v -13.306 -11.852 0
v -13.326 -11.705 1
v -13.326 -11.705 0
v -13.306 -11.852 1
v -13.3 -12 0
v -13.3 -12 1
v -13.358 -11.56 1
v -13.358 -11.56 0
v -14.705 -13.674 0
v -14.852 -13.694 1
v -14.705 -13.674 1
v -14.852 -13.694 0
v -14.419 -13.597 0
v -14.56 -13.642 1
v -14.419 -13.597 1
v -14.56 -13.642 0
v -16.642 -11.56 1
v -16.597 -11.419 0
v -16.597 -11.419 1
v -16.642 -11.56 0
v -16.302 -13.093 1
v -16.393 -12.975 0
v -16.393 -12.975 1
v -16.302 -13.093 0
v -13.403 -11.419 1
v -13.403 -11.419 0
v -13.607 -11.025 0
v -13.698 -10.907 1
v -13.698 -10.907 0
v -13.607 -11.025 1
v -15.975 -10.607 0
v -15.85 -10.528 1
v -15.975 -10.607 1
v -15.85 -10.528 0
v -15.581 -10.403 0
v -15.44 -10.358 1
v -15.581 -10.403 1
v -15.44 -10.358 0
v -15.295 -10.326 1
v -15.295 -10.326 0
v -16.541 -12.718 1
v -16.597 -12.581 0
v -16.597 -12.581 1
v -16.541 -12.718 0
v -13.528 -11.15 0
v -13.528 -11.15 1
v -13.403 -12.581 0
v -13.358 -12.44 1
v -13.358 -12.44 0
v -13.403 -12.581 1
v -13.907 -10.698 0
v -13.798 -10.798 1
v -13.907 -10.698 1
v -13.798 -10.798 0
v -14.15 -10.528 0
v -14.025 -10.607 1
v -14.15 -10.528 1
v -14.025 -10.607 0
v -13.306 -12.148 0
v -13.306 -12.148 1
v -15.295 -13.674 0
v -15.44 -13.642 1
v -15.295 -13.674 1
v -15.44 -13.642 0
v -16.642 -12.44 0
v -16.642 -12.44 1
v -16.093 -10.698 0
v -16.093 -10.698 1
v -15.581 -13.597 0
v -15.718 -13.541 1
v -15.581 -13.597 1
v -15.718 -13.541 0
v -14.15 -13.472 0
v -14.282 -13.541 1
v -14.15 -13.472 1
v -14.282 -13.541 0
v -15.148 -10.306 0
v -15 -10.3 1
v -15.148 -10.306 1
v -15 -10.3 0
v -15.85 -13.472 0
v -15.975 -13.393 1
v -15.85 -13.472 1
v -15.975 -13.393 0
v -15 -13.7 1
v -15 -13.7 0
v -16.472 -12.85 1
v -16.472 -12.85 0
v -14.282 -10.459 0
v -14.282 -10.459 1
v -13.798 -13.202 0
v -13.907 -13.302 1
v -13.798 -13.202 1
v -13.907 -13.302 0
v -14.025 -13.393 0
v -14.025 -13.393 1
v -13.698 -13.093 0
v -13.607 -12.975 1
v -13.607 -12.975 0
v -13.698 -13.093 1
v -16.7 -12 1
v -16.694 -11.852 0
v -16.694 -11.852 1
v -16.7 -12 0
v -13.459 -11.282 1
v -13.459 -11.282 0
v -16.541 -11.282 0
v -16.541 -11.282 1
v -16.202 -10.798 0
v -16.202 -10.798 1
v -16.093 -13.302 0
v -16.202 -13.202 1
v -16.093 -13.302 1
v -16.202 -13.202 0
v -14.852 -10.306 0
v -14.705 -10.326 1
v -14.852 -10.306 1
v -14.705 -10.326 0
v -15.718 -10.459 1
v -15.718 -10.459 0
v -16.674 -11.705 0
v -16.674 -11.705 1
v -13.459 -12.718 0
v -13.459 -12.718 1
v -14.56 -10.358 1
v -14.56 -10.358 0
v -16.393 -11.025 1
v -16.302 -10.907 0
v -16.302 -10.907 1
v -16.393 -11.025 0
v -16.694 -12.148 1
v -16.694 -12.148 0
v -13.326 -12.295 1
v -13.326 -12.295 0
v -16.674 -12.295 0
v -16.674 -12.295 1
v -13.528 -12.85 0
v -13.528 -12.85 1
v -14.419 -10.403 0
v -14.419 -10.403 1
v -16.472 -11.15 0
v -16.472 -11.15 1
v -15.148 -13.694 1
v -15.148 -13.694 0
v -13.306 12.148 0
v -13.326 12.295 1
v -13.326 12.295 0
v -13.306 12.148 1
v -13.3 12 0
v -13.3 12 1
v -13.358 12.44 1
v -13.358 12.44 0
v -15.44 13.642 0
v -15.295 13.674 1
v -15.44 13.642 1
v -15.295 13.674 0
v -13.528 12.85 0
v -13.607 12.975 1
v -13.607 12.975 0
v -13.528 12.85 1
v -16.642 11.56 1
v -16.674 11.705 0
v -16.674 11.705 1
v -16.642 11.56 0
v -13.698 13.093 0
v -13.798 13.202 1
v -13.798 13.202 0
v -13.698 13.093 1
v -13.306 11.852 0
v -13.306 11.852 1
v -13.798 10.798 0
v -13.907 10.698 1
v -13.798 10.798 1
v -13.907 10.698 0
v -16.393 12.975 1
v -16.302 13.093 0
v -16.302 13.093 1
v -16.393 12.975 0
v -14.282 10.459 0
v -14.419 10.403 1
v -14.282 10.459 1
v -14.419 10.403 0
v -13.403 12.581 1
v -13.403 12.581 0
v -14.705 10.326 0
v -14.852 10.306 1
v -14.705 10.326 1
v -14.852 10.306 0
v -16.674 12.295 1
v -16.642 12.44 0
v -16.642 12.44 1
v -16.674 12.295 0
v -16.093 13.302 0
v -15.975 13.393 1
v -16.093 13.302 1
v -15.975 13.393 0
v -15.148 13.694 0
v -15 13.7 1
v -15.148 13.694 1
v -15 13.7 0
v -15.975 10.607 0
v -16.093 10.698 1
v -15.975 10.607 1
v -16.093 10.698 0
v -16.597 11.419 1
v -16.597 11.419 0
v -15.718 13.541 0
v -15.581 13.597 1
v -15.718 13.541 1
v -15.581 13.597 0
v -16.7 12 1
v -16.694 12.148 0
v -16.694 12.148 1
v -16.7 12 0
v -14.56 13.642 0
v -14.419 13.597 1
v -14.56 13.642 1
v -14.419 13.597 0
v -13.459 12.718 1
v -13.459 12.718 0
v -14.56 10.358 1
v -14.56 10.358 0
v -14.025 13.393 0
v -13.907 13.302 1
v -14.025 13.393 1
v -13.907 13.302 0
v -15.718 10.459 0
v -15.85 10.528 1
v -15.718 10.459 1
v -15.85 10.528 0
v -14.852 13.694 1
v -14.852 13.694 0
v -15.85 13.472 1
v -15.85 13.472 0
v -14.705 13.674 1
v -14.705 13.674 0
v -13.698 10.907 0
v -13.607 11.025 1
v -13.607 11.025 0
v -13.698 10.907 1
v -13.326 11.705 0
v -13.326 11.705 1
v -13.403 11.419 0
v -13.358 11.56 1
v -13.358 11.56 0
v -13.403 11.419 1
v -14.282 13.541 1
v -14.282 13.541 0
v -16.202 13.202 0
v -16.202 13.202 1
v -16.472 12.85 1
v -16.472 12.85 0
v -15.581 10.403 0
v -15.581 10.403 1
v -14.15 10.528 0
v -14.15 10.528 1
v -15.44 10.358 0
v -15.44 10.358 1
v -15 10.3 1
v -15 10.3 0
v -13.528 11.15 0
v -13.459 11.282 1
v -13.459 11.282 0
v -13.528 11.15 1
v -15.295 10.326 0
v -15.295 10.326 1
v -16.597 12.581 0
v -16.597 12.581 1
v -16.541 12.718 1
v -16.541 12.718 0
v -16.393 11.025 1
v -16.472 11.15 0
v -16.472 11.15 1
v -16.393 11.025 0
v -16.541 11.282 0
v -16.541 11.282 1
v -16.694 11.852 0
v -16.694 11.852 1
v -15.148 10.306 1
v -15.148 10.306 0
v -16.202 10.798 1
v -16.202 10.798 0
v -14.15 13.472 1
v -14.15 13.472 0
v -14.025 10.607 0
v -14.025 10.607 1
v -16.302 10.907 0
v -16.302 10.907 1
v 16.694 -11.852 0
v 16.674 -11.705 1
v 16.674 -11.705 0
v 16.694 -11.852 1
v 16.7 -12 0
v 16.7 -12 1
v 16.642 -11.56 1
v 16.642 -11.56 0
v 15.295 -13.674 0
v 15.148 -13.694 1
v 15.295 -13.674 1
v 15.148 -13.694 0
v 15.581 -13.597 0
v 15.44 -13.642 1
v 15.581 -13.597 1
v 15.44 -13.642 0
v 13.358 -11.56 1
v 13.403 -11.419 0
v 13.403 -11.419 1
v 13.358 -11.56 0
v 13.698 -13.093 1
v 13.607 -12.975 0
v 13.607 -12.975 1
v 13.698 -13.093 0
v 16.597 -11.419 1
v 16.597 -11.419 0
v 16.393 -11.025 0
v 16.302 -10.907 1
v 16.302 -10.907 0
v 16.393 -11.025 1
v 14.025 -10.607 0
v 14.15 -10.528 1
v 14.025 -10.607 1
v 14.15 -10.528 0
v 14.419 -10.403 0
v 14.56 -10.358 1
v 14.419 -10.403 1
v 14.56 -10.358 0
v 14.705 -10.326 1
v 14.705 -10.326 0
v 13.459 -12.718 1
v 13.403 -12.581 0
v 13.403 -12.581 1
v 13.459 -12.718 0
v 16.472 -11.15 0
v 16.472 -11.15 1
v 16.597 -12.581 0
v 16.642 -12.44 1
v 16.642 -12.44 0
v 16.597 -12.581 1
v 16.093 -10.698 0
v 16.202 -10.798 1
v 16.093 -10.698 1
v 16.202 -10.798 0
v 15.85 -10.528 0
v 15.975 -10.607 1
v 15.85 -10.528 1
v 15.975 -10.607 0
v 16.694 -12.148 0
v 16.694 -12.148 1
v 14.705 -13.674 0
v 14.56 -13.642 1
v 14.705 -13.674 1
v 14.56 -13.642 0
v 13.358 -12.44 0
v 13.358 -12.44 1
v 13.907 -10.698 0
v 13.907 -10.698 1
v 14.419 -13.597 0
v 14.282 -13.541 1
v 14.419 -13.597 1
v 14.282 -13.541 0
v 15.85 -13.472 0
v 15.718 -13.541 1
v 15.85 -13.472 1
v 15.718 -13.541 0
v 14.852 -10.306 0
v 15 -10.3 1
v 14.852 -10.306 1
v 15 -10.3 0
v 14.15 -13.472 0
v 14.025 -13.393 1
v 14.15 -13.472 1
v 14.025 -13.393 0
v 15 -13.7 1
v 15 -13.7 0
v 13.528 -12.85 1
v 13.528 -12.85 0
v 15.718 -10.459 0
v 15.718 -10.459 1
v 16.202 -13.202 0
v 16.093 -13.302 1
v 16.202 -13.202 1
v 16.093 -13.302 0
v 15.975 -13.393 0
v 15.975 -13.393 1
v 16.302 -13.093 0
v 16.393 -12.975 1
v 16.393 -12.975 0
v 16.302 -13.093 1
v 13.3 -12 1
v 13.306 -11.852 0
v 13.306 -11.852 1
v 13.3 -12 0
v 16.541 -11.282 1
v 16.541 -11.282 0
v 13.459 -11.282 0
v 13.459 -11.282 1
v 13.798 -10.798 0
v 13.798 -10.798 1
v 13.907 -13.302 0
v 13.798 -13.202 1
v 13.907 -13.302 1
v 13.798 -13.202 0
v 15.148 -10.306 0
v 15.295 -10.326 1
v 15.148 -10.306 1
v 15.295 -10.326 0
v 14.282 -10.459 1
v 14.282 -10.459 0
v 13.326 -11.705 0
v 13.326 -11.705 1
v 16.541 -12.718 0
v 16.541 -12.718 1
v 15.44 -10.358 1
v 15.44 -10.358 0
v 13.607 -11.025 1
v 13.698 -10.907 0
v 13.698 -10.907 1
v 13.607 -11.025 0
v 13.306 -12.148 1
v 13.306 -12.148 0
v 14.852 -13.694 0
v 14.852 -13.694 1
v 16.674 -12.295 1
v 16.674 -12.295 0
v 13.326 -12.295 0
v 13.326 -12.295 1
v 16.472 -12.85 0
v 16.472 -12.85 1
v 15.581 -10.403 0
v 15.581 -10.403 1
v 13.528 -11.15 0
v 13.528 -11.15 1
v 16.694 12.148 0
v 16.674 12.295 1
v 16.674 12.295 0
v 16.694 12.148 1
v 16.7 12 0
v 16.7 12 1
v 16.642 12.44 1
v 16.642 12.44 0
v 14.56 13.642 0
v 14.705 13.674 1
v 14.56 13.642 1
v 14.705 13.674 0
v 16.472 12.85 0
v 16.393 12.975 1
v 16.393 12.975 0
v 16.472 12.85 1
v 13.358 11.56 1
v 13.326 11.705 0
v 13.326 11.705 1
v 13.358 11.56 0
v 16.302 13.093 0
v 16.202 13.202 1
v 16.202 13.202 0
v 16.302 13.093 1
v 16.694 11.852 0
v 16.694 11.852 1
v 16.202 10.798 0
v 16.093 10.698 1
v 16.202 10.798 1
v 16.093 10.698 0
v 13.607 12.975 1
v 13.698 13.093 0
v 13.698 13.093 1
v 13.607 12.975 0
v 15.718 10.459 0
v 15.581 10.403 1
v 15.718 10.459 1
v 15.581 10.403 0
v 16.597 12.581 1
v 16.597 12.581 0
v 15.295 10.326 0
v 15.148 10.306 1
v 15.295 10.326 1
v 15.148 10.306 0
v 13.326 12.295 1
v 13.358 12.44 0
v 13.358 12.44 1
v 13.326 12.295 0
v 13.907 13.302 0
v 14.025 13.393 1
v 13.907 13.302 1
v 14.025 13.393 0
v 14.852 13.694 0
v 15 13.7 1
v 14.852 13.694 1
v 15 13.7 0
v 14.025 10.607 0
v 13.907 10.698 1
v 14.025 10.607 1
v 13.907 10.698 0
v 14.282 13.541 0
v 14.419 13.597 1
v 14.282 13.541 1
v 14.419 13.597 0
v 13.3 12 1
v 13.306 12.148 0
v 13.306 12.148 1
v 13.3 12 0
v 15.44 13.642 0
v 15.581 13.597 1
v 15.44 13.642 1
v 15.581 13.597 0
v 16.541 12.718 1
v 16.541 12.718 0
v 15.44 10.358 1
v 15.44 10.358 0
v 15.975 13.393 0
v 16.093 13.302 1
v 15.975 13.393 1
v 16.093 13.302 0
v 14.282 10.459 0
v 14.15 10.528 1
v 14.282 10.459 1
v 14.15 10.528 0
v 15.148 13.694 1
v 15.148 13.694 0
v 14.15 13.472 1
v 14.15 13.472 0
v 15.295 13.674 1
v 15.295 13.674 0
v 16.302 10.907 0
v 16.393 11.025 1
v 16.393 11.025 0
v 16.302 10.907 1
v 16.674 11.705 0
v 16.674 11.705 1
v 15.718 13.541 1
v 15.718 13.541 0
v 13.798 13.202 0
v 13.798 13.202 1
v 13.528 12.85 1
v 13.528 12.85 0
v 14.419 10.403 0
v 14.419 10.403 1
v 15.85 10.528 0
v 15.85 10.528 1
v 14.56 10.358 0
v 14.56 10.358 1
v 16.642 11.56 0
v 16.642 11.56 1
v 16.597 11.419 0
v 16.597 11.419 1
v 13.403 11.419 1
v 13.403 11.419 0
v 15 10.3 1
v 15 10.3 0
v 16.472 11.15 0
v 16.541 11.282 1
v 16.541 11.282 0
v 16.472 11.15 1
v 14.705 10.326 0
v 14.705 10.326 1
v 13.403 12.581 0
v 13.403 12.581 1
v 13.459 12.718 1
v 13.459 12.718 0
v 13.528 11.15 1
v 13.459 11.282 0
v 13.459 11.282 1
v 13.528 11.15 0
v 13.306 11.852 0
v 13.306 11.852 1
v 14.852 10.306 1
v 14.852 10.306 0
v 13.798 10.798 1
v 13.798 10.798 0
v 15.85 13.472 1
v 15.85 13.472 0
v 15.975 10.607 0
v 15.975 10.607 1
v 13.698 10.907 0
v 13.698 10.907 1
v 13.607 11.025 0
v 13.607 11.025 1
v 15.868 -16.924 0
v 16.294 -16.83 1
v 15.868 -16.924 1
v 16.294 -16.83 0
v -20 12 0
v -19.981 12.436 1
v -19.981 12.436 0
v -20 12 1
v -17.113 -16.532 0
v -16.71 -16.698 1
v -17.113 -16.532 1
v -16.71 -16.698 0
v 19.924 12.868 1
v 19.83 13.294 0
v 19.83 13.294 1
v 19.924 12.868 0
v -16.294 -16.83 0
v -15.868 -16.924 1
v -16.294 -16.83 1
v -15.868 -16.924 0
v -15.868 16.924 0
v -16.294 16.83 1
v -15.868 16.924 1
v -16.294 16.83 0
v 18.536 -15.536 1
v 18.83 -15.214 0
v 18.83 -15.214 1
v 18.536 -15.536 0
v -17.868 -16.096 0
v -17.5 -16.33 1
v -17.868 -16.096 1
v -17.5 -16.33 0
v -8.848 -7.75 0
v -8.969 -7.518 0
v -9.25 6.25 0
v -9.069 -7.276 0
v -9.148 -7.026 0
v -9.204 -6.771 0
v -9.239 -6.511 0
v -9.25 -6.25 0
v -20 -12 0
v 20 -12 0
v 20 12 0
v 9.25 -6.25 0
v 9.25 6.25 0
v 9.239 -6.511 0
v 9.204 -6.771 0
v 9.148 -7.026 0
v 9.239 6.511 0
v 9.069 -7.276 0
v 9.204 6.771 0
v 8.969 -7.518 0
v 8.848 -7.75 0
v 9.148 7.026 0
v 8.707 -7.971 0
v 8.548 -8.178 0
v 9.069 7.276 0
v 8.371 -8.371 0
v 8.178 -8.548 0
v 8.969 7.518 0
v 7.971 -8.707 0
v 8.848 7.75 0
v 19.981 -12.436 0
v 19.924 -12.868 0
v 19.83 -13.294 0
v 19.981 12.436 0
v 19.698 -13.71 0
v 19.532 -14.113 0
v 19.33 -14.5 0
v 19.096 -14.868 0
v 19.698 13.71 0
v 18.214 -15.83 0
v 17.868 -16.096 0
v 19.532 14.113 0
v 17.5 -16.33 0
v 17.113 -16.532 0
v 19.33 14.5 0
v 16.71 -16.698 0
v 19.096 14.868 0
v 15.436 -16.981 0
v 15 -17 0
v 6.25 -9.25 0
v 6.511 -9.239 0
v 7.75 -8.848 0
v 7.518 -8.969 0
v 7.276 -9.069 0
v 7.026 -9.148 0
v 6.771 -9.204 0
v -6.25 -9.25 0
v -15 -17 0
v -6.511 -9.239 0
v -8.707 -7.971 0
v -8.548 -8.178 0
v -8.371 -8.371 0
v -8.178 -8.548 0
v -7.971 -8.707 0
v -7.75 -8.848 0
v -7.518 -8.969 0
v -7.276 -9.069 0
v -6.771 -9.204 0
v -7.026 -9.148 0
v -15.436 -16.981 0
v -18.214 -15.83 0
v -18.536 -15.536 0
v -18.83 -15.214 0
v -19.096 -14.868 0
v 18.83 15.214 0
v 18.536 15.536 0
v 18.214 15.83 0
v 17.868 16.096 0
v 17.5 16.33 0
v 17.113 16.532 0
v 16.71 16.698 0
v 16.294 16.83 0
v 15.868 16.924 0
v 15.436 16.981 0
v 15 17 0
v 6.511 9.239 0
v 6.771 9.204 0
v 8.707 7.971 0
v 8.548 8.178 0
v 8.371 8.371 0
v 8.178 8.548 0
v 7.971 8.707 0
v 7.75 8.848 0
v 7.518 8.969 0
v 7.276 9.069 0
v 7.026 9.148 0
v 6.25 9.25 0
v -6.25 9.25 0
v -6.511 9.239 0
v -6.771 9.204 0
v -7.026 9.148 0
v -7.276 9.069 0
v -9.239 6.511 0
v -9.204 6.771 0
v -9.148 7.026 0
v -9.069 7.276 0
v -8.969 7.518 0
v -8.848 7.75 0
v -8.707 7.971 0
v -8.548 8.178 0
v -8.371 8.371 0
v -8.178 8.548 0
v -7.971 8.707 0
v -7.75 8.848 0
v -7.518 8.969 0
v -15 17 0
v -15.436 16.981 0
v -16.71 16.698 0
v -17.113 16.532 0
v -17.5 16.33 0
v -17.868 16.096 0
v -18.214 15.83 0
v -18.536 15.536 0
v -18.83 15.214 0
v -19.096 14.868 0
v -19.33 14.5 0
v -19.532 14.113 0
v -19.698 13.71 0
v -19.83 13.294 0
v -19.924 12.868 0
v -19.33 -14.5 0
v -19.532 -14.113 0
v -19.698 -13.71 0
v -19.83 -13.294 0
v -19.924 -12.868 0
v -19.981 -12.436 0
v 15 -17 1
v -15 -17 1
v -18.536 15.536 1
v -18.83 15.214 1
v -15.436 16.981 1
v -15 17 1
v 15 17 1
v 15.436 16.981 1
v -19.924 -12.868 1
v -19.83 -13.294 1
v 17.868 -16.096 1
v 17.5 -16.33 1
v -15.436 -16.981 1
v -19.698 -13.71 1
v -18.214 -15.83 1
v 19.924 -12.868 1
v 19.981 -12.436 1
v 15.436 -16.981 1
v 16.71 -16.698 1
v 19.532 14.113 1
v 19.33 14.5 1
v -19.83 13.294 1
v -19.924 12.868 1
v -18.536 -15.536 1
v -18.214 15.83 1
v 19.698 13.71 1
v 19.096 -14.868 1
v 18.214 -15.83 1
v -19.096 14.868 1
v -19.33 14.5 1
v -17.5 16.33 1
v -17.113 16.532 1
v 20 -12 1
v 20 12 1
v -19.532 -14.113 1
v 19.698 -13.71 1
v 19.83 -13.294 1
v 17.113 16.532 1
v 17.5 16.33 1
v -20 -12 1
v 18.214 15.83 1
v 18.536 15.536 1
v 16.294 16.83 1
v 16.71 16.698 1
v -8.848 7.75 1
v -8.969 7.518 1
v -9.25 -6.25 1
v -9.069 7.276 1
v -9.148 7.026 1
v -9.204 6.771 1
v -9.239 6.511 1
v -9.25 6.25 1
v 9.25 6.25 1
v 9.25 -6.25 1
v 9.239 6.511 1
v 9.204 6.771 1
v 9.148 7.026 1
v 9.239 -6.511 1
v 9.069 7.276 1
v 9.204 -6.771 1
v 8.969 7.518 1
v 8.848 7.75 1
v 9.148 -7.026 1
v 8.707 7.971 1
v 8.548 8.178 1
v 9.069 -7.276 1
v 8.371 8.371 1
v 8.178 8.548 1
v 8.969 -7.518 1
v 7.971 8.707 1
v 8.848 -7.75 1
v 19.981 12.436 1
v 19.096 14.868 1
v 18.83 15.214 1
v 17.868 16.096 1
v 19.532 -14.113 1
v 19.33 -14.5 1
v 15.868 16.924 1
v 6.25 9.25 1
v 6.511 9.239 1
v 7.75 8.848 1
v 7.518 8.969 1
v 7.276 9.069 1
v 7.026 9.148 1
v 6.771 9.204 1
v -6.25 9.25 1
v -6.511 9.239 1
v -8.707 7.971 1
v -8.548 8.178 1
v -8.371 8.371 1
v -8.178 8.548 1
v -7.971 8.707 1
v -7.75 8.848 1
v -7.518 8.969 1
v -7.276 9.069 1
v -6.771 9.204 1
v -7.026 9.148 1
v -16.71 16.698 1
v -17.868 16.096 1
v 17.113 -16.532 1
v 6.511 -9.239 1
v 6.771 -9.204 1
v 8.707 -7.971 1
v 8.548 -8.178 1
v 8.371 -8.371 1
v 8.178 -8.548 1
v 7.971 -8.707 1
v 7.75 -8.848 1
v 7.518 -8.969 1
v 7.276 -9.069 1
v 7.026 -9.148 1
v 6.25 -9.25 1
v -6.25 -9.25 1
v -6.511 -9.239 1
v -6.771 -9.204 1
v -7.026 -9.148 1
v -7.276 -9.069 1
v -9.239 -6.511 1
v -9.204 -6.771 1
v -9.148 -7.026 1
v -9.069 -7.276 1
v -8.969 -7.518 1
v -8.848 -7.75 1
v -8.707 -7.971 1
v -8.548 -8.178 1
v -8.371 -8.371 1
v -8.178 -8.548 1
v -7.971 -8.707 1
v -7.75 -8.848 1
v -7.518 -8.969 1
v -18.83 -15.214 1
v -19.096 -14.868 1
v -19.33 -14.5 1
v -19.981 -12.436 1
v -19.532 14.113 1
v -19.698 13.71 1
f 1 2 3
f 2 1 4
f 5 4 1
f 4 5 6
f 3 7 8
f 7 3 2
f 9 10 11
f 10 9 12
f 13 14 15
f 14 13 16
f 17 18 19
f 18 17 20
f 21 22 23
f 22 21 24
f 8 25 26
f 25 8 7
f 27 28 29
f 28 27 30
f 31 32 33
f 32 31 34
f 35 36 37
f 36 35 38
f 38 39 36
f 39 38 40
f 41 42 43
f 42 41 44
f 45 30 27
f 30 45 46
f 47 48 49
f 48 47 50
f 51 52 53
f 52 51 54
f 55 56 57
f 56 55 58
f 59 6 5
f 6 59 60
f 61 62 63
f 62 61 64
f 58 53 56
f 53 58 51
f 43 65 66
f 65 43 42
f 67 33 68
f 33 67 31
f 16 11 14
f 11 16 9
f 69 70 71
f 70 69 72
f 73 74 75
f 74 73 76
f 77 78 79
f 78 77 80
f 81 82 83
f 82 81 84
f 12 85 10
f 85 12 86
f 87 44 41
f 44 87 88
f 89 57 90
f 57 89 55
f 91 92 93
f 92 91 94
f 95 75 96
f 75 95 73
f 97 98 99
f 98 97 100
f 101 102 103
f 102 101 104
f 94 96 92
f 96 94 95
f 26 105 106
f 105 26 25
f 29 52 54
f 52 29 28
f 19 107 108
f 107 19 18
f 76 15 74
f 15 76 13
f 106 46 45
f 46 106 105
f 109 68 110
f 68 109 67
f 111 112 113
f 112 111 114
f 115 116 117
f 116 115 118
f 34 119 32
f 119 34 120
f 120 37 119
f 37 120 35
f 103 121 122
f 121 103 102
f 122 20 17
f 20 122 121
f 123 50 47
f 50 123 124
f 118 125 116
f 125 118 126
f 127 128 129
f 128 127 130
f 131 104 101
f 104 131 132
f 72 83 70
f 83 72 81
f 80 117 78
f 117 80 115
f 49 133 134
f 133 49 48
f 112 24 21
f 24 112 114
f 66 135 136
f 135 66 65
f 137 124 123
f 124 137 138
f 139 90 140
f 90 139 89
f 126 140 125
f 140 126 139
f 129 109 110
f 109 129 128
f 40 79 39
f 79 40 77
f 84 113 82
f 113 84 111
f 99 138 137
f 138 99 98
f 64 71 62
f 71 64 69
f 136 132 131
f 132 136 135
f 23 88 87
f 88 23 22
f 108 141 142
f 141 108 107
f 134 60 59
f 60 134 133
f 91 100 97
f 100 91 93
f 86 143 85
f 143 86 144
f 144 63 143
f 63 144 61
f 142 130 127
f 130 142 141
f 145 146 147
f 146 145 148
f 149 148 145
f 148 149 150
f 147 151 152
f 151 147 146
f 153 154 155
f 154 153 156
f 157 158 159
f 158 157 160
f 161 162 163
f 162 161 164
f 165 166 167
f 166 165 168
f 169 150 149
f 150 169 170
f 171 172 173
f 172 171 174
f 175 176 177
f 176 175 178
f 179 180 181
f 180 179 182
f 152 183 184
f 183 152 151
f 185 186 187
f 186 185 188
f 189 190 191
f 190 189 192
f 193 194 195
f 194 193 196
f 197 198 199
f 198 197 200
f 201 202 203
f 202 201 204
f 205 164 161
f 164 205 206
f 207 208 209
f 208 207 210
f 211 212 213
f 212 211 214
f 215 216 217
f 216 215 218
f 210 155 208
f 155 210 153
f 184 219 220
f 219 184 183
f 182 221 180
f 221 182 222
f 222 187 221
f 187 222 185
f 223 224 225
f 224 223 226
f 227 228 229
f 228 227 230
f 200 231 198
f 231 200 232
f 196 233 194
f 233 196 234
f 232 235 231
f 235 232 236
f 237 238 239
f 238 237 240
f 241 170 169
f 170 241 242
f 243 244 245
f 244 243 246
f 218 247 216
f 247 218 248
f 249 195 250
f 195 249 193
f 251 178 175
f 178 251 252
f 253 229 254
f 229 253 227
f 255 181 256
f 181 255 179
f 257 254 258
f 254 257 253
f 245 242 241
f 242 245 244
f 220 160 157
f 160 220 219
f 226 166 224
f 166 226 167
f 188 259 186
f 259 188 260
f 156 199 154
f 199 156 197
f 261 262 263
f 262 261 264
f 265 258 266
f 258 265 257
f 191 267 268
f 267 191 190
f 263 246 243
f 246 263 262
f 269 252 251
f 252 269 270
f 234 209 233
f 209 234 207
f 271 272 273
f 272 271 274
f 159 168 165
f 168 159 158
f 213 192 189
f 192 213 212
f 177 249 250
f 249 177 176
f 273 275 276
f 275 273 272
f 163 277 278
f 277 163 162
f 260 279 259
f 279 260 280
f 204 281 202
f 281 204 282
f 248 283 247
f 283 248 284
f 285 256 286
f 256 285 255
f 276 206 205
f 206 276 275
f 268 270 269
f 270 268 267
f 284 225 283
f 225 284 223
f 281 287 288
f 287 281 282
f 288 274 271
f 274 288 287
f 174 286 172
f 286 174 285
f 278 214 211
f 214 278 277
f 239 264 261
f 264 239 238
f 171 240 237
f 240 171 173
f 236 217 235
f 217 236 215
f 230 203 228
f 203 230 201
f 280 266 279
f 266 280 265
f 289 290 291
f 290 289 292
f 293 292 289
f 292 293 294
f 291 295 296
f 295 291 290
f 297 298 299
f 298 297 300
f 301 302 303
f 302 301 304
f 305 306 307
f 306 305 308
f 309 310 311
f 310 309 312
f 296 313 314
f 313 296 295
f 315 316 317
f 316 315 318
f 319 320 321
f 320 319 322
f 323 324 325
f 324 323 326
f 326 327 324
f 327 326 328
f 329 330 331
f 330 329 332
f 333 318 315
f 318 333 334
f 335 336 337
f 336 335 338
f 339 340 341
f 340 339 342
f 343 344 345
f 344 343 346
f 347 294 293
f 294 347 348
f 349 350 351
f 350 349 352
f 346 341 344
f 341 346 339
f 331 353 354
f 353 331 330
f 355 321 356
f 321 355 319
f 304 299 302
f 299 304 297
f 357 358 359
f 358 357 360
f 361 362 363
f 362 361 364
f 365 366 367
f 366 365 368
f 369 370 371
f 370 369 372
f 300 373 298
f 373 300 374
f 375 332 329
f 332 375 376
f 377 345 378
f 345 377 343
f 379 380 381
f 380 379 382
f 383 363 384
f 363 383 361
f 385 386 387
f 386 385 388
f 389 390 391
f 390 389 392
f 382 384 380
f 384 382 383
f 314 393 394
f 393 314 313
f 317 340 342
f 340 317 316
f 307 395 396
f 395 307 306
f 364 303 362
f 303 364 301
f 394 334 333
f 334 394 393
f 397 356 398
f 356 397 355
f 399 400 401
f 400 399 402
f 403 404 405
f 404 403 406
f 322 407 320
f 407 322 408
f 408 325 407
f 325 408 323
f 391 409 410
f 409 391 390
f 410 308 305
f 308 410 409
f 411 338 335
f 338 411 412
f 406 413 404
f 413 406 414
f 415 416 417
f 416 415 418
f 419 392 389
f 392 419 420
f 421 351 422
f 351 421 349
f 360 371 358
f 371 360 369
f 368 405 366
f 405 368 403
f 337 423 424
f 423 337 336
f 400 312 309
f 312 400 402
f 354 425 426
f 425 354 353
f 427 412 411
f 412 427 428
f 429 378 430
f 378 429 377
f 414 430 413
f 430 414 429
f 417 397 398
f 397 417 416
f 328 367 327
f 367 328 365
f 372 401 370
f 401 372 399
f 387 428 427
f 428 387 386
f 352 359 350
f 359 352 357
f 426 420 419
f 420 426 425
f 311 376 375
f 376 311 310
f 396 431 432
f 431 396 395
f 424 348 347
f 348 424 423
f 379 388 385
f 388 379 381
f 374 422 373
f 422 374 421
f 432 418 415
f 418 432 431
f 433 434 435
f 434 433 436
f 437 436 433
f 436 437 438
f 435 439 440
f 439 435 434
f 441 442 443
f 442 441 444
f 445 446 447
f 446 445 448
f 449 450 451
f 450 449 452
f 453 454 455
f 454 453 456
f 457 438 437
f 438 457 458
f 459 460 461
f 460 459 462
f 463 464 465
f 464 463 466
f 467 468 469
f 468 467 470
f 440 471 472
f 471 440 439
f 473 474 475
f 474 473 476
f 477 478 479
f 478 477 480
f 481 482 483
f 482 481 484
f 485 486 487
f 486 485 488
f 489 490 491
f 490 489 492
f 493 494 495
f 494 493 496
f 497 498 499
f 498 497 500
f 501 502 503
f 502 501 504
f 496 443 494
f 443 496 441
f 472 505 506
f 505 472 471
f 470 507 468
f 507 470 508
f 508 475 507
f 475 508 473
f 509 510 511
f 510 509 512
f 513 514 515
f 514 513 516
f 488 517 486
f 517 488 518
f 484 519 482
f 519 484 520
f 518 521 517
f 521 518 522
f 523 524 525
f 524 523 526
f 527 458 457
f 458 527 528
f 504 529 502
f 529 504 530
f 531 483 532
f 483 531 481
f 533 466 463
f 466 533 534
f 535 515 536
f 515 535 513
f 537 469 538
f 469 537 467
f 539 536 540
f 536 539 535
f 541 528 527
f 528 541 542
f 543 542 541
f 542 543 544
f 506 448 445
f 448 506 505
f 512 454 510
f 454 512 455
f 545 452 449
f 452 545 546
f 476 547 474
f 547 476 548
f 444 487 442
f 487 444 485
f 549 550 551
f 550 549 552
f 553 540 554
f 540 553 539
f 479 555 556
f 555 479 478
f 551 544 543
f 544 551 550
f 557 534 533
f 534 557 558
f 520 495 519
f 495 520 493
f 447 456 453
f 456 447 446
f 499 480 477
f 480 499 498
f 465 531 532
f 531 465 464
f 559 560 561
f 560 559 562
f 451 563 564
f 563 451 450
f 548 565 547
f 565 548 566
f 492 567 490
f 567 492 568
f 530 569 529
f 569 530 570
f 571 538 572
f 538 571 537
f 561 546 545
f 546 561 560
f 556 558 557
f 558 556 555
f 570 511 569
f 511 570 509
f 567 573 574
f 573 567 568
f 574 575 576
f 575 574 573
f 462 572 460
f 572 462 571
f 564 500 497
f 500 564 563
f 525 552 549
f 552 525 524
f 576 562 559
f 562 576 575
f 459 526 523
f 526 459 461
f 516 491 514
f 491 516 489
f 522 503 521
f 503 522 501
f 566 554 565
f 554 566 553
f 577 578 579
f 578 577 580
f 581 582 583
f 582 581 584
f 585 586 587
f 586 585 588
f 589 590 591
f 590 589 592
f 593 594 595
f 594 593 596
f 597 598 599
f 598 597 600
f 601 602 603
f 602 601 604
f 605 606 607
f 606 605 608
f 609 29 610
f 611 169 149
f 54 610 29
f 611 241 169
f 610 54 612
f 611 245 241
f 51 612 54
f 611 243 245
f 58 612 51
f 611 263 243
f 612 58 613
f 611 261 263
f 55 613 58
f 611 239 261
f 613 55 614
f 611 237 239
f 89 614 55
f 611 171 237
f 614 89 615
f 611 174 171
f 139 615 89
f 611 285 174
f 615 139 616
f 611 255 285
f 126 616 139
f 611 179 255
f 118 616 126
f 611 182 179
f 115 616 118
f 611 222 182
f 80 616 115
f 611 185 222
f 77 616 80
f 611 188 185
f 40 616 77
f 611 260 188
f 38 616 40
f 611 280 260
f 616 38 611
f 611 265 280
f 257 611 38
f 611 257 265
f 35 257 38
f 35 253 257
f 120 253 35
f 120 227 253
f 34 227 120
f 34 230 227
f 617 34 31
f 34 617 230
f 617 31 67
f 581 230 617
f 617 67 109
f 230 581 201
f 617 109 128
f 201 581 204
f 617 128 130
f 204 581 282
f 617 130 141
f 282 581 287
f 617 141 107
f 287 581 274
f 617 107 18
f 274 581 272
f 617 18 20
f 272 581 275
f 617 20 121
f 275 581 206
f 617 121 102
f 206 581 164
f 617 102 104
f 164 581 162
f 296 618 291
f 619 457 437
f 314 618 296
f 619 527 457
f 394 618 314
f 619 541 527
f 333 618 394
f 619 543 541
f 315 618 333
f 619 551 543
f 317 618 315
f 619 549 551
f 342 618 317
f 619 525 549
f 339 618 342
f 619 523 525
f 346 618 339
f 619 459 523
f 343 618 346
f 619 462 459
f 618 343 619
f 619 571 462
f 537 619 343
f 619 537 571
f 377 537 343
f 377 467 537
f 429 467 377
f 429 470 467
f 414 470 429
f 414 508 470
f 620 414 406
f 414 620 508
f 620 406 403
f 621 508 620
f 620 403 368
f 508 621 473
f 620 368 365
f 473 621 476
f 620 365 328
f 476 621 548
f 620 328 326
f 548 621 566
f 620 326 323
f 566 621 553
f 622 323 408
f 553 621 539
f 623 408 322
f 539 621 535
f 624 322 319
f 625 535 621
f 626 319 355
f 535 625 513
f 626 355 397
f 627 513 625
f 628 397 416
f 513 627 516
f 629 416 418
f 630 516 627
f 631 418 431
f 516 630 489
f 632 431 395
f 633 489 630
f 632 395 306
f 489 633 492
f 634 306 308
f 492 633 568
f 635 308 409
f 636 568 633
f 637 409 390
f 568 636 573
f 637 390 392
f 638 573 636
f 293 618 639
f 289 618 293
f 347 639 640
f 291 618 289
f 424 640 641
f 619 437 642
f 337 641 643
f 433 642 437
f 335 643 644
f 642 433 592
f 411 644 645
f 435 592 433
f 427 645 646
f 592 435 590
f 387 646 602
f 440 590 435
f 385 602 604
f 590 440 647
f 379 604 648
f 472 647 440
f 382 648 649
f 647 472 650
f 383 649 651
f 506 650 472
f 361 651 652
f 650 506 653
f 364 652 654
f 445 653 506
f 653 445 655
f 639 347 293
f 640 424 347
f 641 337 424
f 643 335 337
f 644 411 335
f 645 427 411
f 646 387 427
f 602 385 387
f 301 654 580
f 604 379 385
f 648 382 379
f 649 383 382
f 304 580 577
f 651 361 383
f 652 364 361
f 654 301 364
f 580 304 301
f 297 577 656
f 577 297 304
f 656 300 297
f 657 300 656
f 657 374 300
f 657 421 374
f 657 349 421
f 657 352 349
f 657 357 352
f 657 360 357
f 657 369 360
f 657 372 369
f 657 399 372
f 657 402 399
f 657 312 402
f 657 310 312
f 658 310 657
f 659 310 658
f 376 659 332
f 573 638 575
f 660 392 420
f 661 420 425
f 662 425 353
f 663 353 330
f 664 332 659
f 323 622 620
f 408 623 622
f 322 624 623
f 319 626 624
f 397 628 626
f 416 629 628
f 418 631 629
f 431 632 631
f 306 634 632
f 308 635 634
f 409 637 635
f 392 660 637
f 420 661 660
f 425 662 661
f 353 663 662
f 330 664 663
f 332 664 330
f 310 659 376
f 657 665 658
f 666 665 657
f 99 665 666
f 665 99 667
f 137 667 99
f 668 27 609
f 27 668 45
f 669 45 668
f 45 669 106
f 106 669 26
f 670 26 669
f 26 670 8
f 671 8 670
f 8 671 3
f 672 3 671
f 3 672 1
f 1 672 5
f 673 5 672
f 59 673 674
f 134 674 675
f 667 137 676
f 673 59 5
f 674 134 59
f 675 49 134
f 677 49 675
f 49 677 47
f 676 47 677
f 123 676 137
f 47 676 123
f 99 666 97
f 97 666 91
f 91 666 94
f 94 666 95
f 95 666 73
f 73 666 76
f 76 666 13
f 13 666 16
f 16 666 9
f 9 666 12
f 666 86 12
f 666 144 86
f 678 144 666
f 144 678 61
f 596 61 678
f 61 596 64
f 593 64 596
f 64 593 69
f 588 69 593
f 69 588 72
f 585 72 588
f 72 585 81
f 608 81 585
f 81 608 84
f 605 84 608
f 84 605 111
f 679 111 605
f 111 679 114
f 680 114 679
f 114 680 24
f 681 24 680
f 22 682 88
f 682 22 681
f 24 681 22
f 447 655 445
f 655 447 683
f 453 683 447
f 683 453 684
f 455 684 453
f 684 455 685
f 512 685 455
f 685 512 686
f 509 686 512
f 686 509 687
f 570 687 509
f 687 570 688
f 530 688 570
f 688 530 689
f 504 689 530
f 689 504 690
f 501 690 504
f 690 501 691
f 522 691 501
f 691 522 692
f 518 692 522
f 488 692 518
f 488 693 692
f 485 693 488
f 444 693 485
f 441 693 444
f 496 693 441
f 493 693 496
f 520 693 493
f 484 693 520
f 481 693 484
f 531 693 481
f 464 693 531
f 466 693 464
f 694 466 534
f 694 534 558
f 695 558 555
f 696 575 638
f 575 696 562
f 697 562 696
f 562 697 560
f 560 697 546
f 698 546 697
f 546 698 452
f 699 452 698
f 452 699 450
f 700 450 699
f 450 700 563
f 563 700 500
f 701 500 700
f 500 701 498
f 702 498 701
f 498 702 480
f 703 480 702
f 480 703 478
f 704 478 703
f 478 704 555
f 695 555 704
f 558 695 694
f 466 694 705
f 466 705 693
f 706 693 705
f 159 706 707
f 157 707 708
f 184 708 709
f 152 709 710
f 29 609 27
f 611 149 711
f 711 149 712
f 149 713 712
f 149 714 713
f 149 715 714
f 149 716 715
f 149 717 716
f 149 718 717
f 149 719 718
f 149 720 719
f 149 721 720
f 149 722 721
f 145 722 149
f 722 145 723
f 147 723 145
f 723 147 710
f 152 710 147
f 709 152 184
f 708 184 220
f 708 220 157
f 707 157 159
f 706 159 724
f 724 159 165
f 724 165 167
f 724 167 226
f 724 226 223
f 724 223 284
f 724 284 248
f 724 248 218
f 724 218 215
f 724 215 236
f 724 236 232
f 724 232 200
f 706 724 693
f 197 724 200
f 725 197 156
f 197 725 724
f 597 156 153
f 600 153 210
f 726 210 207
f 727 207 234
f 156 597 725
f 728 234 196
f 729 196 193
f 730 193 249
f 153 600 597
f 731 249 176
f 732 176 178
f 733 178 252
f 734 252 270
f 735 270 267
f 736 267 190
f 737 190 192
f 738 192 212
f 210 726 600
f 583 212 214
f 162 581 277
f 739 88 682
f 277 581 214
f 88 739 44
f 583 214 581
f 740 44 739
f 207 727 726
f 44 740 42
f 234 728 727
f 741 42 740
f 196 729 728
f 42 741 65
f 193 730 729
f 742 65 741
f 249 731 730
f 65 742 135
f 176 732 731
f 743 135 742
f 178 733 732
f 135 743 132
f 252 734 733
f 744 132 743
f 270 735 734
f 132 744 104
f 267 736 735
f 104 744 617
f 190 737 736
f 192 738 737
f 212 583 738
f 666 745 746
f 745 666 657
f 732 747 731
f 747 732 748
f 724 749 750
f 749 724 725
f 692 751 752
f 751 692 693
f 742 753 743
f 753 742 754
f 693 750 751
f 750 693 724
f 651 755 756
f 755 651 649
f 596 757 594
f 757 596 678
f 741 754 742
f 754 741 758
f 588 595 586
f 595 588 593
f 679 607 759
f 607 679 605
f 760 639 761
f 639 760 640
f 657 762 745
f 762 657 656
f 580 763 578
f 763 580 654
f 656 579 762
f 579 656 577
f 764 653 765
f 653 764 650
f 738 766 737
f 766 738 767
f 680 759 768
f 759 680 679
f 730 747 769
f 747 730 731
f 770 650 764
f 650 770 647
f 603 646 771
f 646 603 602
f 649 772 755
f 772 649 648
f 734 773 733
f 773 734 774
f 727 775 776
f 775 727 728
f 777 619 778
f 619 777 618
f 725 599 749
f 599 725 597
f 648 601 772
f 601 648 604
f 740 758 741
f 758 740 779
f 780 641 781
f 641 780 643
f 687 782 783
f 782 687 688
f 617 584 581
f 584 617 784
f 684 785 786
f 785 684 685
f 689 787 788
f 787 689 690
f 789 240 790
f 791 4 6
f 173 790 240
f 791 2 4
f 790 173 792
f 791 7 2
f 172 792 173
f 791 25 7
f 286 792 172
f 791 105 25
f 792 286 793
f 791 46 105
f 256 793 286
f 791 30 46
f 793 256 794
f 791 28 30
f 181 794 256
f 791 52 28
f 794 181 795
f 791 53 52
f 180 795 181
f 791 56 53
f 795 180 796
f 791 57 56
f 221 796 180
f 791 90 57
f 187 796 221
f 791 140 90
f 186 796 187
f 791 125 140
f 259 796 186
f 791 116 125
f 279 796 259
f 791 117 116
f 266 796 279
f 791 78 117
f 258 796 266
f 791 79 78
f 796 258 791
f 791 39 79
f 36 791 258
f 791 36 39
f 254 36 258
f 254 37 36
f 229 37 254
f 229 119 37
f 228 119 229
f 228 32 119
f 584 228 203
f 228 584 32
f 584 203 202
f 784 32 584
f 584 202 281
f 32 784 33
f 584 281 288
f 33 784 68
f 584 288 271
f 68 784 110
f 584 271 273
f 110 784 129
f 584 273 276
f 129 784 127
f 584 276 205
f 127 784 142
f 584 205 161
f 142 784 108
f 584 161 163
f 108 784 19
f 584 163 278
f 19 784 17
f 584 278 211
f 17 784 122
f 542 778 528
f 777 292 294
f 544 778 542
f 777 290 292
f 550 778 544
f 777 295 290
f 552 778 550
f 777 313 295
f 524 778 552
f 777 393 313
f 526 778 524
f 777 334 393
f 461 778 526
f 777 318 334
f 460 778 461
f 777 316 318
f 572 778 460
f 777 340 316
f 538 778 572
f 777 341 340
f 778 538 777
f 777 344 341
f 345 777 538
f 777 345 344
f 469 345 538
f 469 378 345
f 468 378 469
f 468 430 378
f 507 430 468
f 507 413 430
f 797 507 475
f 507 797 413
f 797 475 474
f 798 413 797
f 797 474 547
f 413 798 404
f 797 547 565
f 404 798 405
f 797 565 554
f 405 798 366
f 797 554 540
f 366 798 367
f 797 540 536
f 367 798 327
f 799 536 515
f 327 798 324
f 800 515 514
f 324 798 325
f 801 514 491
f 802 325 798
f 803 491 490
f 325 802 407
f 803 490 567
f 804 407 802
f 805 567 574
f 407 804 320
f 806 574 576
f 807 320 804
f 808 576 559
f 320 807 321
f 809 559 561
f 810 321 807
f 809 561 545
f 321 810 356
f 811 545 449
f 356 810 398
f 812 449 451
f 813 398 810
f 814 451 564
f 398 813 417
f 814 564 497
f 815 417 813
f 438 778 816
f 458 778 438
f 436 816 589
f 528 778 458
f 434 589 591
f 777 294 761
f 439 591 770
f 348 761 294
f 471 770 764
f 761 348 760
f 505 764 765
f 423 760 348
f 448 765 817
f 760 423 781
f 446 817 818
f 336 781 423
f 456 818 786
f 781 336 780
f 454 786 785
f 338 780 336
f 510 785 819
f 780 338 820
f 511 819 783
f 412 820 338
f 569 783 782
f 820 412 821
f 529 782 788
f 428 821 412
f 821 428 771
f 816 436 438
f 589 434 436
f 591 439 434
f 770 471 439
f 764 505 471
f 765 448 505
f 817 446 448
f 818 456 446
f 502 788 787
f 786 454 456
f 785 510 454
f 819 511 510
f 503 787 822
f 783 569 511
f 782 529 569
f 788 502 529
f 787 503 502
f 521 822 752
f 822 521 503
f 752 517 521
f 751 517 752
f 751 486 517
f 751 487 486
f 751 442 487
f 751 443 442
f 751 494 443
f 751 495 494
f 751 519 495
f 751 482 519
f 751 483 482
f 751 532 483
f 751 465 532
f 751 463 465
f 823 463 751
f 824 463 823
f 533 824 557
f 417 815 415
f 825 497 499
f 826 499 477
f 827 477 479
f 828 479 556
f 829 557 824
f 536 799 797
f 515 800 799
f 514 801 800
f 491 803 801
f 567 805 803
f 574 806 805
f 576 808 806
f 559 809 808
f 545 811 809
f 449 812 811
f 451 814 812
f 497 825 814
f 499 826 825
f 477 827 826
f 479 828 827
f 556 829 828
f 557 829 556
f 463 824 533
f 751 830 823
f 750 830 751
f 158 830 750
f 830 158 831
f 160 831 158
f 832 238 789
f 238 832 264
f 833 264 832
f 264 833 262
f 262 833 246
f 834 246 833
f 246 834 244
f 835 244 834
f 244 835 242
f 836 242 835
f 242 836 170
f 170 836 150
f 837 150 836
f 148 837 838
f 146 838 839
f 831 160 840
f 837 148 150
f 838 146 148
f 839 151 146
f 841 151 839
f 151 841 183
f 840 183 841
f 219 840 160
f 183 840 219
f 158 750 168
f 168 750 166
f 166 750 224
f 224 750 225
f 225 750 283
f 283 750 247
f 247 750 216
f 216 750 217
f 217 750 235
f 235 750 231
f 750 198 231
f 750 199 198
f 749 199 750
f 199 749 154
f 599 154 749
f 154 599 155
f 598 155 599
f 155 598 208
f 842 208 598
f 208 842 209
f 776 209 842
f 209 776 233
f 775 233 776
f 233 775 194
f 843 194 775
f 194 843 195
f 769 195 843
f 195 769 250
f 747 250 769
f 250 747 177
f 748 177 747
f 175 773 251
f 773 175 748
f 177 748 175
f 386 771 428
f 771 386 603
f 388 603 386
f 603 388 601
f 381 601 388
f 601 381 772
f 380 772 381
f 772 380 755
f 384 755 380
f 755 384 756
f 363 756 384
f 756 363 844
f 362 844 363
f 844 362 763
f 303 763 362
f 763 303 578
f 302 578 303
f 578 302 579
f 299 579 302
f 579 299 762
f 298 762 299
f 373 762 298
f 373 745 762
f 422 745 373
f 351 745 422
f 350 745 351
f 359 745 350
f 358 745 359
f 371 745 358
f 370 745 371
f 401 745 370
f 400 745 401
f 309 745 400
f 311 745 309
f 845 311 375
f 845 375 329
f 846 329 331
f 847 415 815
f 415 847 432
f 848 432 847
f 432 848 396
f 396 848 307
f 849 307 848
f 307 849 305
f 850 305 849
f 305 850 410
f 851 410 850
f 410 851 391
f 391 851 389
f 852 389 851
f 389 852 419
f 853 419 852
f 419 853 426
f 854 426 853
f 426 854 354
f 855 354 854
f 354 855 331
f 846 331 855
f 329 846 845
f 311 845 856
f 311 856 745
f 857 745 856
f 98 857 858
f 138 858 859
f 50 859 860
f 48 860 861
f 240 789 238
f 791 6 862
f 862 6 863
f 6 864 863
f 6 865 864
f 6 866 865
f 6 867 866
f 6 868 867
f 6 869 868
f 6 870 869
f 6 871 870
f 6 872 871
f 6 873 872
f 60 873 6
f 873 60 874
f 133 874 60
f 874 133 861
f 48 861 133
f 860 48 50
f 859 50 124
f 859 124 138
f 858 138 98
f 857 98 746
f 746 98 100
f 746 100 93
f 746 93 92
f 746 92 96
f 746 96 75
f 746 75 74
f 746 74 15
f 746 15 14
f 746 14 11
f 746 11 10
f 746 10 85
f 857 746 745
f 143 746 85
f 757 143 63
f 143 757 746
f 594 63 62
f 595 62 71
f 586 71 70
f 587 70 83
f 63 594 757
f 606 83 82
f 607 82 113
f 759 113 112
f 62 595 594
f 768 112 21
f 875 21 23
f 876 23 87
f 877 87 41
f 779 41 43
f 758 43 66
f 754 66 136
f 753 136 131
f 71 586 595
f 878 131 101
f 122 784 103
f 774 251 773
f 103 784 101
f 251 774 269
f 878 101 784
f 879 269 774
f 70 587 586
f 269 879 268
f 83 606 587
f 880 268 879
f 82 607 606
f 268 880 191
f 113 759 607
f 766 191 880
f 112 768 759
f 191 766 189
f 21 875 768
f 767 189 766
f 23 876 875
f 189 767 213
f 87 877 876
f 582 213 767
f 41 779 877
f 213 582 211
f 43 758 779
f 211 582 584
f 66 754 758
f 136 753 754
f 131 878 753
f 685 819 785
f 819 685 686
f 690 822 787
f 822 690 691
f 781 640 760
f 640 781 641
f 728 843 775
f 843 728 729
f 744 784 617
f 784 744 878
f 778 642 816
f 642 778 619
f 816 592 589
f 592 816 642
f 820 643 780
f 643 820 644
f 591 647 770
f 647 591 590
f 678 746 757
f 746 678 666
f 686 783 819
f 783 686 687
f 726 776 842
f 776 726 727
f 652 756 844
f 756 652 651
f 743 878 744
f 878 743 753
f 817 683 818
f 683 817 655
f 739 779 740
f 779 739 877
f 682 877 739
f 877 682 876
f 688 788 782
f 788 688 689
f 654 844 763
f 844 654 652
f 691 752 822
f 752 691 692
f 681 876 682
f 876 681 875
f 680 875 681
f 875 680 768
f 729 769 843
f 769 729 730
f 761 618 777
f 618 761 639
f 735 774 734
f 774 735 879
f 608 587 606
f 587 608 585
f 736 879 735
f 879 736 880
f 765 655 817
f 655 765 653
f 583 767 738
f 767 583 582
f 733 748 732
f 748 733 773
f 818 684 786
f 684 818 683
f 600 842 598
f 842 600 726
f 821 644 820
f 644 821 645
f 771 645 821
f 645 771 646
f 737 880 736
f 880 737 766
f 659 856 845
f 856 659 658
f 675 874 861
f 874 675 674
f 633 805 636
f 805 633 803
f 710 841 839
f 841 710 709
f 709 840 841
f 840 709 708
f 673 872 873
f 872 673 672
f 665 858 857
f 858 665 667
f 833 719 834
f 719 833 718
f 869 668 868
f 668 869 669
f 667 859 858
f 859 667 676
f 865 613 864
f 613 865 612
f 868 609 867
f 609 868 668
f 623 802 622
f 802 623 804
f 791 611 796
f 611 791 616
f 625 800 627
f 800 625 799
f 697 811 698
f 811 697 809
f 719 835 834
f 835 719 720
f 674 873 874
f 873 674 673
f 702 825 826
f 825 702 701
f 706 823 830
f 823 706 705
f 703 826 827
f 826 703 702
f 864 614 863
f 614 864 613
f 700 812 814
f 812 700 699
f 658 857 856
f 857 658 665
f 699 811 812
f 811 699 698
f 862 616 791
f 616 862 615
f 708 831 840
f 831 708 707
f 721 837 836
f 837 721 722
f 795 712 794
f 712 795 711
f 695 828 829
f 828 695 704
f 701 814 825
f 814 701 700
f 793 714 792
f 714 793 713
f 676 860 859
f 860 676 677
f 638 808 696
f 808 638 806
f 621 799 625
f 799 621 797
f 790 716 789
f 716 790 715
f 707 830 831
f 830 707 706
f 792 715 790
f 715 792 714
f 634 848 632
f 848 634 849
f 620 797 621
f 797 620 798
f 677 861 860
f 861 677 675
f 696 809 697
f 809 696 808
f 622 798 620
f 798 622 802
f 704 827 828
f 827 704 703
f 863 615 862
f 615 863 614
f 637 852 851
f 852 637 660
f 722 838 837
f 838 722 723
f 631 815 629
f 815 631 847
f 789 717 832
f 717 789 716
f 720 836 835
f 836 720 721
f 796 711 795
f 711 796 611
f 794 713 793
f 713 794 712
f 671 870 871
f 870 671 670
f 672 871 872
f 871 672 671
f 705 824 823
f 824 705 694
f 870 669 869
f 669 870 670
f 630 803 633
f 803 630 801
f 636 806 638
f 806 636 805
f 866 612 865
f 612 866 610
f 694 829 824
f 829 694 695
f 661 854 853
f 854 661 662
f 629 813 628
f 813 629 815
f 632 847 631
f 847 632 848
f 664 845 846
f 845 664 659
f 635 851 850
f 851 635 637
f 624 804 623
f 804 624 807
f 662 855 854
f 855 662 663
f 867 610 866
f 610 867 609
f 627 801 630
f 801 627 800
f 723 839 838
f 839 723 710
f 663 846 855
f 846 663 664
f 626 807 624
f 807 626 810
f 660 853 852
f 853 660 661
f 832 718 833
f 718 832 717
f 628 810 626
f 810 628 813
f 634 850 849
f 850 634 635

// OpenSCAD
// file: woli_config.scad
// ============================================================
// WOLI V1.1 AUDITED FINAL — MASTER PARAMETERS
// Units: mm
// ============================================================

$fn = 72;

// ---------- GLOBAL ----------
fit_clearance = 0.40;
wall = 3.0;
floor_t = 5.0;
cover_t = 2.8;
shell_r = 10.0;

m3_clear = 3.4;
m3_pilot_d = 2.8;
m3_pilot_depth = 4.2;

tie_slot_w = 3.8;
tie_slot_l = 18;

// ---------- BODY ----------
body_w = 170;
body_l = 90;
chassis_h = 31;
top_h = 34;

top_upper_w = 162;
top_upper_l = 80;
top_upper_r = 9;

// ---------- N20 DRIVE ----------
wheel_d = 43;
wheel_w = 17.5;

n20_x = 12;
n20_y = 33;
n20_z = 10;

n20_bracket_x = 25;
n20_bracket_y = 8.5;
n20_bracket_z = 11.5;
n20_bracket_hole_cc = 17;      // approx; slots absorb error

wheel_axis_ground_z = wheel_d/2; // reference only; actual chassis ground plane requires hardware check
wheel_opening_l = 25;            // side wheel cutout depth (Y), mm
motor_y = -body_l/2 + body_l/3;  // wheel center: 1/3 body depth in from front (-Y)
motor_slot_len = 8;
motor_bracket_zone_x = body_w/2 - 18;

// ---------- BALL CASTER ----------
caster_w = 22;
caster_l = 17;
caster_h = 15;
caster_ball_d_visual_ref = 11.5; // photo-only reference; not used for fit
caster_dock_y = body_l/2 - 21;

caster_body_clear = 0.7;
caster_retainer_t = 3.0;
caster_retainer_screw_cc = 27;

caster_mount_x = 15;
caster_mount_y = 12;
caster_floor_open = 18.5;

// ---------- MAIN PCB ----------
pcb_w = 50;
pcb_l = 70;
pcb_stack_h = 15;

pcb_tray_w = 56;
pcb_tray_l = 76;
pcb_mount_cc_x = 44;
pcb_mount_cc_y = 64;

// ---------- MG90S ----------
servo_a = 32.4;
servo_b = 32.5;
servo_c = 12;
servo_fit = 0.7;

// ---------- LIMIT SWITCH ----------
limit_w = 21;
limit_l = 23;
limit_h = 6;

// ---------- VL53L0X ----------
tof_w = 10.7;
tof_l = 25;
tof_h = 11.5;
tof_rail_clear = 0.7;

tof_bezel_w = 34;
tof_bezel_h = 19;

// ---------- PHONE HOLDER / NECK ----------
phone_ball_d = 18.0;            // physical socket fit still required
neck_h = 30;
neck_base_w = 54;
neck_base_l = 42;
neck_base_h = 5;
neck_hole_x = 38;
neck_hole_y = 26;

neck_recess_w = 62;
neck_recess_l = 50;
neck_recess_d = 1.2;

neck_pilot_d = 2.8;
neck_pilot_depth = 7.0;

// reference phone clearance envelope only
phone_ref_w = 165;
phone_ref_h = 82;
phone_ref_t = 12;

// ---------- KLIFE PD-Q2 BATTERY ----------
battery_w = 68;
battery_l = 143;
battery_h = 11;
battery_mass_g = 205;

battery_fit_clear = 0.8;
battery_tray_w = 84;
battery_tray_l = 146;
battery_tray_t = 2.4;
battery_rail_t = 2.5;
battery_rail_h = 5.5;
battery_center_y = -18;

battery_tray_mount_x = 39;
battery_tray_mount_y = 55;

// ---------- UPPER ELECTRONICS DECK ----------
bridge_w = 122;
bridge_l = 94;
bridge_t = 3.0;
bridge_leg_h = 20;
bridge_leg_x = 56;
bridge_leg_y = 36;

module_boss_h = 4.5;
module_boss_d = 8.0;
module_pilot_d = 2.8;

pcb_deck_cx = -25;
pcb_deck_cy = 0;

tb_deck_cx = 34;
tb_deck_cy = 17;

usbc_deck_cx = 36;
usbc_deck_cy = -24;

// ---------- TB6612FNG HW-166 ----------
tb6612_w = 26;
tb6612_l = 26;
tb6612_clear = 0.6;

// total installed height is intentionally not hard-coded

// ---------- USB-C BREAKOUT ----------
usbc_board_w = 12;
usbc_board_l = 15;
usbc_connector_h = 4.2;
usbc_clear = 0.6;

// ---------- TOP COVER INTERFACE ----------
cover_skirt_depth = 4.0;
cover_skirt_clear = 0.8;
cover_skirt_t = 2.5;

cover_side_screw_y = 55 * body_l / 190;
cover_side_screw_z = -2.5;

rear_service_w = 42;
rear_service_h = 14;
rear_hatch_screw_x = 19;
rear_hatch_center_z = 10;

// ---------- CABLE MANAGEMENT ----------
cable_bridge_w = 24;
cable_bridge_l = 14;
cable_bridge_h = 8;
cable_bridge_channel = 8;

// ---------- SERVO LOCK FRAMEWORK ----------
lock_angle_deg = 90;
unlock_angle_deg = 10;

lock_plate_d = 28;
lock_arm_w = 10;
lock_arm_t = 4.0;
lock_reach = 22;
lock_tip_d = 10;

horn_center_clear_d = 7.0;
horn_slot_d = 2.4;              // physical stock-horn check required
horn_slot_len = 8.0;
horn_slot_radius = 8.0;

lock_pad_t = 2.0;
lock_pad_d = 11.0;
// file: woli_lib.scad
include <woli_config.scad>;

module rr2d(w,l,r){
    offset(r=r) square([w-2*r,l-2*r], center=true);
}

module rplate(w,l,h,r){
    linear_extrude(height=h) rr2d(w,l,r);
}

module rshell(w,l,h,r,t,bottom){
    difference(){
        rplate(w,l,h,r);
        translate([0,0,bottom])
            rplate(w-2*t,l-2*t,h,r-t);
    }
}

module slot2d(len,d){
    hull(){
        translate([-len/2,0]) circle(d=d);
        translate([ len/2,0]) circle(d=d);
    }
}

module slot3d(len,d,h){
    linear_extrude(height=h) slot2d(len,d);
}

module tie_slot(h=5){
    rplate(tie_slot_w,tie_slot_l,h,1.2);
}

module body_screw_pattern(h=20){
    for(x=[-screw_x,screw_x])
        for(y=[-screw_y,screw_y])
            translate([x,y,-1])
                cylinder(h=h,d=m3_clear);
}

module body_bosses(h=20){
    for(x=[-screw_x,screw_x])
        for(y=[-screw_y,screw_y])
            translate([x,y,0])
                cylinder(h=h,d=m3_boss_d);
}


// Closed-top shell for removable upper cover.
// Leaves the underside open and preserves a roof thickness.
module top_shell(w,l,h,r,t){
    difference(){
        rplate(w,l,h,r);
        translate([0,0,-0.1])
            rplate(w-2*t,l-2*t,h-t+0.1,r-t);
    }
}


// Tapered rounded solid built from two rounded plates.
// Useful for product-like enclosure shoulders.
module tapered_rounded_solid(w0,l0,w1,l1,h,r0,r1){
    hull(){
        rplate(w0,l0,0.8,r0);
        translate([0,0,h-0.8])
            rplate(w1,l1,0.8,r1);
    }
}

// Open-bottom tapered cover with closed roof.
module tapered_top_shell(w0,l0,w1,l1,h,r0,r1,t){
    difference(){
        tapered_rounded_solid(w0,l0,w1,l1,h,r0,r1);
        translate([0,0,-0.1])
            tapered_rounded_solid(
                w0-2*t,l0-2*t,
                w1-2*t,l1-2*t,
                h-t+0.1,
                max(r0-t,1),max(r1-t,1)
            );
    }
}
// main file
include <woli_lib.scad>;
shim_h = is_undef(SHIM_H) ? 1 : SHIM_H;

difference(){
    rplate(40,34,shim_h,5);

    translate([0,0,-0.1])
        rplate(caster_floor_open,caster_floor_open,shim_h+0.3,3);

    for(x=[-caster_mount_x,caster_mount_x])
        for(y=[-caster_mount_y,caster_mount_y])
            translate([x,y,-0.1])
                cylinder(h=shim_h+0.3,d=m3_clear);
}
